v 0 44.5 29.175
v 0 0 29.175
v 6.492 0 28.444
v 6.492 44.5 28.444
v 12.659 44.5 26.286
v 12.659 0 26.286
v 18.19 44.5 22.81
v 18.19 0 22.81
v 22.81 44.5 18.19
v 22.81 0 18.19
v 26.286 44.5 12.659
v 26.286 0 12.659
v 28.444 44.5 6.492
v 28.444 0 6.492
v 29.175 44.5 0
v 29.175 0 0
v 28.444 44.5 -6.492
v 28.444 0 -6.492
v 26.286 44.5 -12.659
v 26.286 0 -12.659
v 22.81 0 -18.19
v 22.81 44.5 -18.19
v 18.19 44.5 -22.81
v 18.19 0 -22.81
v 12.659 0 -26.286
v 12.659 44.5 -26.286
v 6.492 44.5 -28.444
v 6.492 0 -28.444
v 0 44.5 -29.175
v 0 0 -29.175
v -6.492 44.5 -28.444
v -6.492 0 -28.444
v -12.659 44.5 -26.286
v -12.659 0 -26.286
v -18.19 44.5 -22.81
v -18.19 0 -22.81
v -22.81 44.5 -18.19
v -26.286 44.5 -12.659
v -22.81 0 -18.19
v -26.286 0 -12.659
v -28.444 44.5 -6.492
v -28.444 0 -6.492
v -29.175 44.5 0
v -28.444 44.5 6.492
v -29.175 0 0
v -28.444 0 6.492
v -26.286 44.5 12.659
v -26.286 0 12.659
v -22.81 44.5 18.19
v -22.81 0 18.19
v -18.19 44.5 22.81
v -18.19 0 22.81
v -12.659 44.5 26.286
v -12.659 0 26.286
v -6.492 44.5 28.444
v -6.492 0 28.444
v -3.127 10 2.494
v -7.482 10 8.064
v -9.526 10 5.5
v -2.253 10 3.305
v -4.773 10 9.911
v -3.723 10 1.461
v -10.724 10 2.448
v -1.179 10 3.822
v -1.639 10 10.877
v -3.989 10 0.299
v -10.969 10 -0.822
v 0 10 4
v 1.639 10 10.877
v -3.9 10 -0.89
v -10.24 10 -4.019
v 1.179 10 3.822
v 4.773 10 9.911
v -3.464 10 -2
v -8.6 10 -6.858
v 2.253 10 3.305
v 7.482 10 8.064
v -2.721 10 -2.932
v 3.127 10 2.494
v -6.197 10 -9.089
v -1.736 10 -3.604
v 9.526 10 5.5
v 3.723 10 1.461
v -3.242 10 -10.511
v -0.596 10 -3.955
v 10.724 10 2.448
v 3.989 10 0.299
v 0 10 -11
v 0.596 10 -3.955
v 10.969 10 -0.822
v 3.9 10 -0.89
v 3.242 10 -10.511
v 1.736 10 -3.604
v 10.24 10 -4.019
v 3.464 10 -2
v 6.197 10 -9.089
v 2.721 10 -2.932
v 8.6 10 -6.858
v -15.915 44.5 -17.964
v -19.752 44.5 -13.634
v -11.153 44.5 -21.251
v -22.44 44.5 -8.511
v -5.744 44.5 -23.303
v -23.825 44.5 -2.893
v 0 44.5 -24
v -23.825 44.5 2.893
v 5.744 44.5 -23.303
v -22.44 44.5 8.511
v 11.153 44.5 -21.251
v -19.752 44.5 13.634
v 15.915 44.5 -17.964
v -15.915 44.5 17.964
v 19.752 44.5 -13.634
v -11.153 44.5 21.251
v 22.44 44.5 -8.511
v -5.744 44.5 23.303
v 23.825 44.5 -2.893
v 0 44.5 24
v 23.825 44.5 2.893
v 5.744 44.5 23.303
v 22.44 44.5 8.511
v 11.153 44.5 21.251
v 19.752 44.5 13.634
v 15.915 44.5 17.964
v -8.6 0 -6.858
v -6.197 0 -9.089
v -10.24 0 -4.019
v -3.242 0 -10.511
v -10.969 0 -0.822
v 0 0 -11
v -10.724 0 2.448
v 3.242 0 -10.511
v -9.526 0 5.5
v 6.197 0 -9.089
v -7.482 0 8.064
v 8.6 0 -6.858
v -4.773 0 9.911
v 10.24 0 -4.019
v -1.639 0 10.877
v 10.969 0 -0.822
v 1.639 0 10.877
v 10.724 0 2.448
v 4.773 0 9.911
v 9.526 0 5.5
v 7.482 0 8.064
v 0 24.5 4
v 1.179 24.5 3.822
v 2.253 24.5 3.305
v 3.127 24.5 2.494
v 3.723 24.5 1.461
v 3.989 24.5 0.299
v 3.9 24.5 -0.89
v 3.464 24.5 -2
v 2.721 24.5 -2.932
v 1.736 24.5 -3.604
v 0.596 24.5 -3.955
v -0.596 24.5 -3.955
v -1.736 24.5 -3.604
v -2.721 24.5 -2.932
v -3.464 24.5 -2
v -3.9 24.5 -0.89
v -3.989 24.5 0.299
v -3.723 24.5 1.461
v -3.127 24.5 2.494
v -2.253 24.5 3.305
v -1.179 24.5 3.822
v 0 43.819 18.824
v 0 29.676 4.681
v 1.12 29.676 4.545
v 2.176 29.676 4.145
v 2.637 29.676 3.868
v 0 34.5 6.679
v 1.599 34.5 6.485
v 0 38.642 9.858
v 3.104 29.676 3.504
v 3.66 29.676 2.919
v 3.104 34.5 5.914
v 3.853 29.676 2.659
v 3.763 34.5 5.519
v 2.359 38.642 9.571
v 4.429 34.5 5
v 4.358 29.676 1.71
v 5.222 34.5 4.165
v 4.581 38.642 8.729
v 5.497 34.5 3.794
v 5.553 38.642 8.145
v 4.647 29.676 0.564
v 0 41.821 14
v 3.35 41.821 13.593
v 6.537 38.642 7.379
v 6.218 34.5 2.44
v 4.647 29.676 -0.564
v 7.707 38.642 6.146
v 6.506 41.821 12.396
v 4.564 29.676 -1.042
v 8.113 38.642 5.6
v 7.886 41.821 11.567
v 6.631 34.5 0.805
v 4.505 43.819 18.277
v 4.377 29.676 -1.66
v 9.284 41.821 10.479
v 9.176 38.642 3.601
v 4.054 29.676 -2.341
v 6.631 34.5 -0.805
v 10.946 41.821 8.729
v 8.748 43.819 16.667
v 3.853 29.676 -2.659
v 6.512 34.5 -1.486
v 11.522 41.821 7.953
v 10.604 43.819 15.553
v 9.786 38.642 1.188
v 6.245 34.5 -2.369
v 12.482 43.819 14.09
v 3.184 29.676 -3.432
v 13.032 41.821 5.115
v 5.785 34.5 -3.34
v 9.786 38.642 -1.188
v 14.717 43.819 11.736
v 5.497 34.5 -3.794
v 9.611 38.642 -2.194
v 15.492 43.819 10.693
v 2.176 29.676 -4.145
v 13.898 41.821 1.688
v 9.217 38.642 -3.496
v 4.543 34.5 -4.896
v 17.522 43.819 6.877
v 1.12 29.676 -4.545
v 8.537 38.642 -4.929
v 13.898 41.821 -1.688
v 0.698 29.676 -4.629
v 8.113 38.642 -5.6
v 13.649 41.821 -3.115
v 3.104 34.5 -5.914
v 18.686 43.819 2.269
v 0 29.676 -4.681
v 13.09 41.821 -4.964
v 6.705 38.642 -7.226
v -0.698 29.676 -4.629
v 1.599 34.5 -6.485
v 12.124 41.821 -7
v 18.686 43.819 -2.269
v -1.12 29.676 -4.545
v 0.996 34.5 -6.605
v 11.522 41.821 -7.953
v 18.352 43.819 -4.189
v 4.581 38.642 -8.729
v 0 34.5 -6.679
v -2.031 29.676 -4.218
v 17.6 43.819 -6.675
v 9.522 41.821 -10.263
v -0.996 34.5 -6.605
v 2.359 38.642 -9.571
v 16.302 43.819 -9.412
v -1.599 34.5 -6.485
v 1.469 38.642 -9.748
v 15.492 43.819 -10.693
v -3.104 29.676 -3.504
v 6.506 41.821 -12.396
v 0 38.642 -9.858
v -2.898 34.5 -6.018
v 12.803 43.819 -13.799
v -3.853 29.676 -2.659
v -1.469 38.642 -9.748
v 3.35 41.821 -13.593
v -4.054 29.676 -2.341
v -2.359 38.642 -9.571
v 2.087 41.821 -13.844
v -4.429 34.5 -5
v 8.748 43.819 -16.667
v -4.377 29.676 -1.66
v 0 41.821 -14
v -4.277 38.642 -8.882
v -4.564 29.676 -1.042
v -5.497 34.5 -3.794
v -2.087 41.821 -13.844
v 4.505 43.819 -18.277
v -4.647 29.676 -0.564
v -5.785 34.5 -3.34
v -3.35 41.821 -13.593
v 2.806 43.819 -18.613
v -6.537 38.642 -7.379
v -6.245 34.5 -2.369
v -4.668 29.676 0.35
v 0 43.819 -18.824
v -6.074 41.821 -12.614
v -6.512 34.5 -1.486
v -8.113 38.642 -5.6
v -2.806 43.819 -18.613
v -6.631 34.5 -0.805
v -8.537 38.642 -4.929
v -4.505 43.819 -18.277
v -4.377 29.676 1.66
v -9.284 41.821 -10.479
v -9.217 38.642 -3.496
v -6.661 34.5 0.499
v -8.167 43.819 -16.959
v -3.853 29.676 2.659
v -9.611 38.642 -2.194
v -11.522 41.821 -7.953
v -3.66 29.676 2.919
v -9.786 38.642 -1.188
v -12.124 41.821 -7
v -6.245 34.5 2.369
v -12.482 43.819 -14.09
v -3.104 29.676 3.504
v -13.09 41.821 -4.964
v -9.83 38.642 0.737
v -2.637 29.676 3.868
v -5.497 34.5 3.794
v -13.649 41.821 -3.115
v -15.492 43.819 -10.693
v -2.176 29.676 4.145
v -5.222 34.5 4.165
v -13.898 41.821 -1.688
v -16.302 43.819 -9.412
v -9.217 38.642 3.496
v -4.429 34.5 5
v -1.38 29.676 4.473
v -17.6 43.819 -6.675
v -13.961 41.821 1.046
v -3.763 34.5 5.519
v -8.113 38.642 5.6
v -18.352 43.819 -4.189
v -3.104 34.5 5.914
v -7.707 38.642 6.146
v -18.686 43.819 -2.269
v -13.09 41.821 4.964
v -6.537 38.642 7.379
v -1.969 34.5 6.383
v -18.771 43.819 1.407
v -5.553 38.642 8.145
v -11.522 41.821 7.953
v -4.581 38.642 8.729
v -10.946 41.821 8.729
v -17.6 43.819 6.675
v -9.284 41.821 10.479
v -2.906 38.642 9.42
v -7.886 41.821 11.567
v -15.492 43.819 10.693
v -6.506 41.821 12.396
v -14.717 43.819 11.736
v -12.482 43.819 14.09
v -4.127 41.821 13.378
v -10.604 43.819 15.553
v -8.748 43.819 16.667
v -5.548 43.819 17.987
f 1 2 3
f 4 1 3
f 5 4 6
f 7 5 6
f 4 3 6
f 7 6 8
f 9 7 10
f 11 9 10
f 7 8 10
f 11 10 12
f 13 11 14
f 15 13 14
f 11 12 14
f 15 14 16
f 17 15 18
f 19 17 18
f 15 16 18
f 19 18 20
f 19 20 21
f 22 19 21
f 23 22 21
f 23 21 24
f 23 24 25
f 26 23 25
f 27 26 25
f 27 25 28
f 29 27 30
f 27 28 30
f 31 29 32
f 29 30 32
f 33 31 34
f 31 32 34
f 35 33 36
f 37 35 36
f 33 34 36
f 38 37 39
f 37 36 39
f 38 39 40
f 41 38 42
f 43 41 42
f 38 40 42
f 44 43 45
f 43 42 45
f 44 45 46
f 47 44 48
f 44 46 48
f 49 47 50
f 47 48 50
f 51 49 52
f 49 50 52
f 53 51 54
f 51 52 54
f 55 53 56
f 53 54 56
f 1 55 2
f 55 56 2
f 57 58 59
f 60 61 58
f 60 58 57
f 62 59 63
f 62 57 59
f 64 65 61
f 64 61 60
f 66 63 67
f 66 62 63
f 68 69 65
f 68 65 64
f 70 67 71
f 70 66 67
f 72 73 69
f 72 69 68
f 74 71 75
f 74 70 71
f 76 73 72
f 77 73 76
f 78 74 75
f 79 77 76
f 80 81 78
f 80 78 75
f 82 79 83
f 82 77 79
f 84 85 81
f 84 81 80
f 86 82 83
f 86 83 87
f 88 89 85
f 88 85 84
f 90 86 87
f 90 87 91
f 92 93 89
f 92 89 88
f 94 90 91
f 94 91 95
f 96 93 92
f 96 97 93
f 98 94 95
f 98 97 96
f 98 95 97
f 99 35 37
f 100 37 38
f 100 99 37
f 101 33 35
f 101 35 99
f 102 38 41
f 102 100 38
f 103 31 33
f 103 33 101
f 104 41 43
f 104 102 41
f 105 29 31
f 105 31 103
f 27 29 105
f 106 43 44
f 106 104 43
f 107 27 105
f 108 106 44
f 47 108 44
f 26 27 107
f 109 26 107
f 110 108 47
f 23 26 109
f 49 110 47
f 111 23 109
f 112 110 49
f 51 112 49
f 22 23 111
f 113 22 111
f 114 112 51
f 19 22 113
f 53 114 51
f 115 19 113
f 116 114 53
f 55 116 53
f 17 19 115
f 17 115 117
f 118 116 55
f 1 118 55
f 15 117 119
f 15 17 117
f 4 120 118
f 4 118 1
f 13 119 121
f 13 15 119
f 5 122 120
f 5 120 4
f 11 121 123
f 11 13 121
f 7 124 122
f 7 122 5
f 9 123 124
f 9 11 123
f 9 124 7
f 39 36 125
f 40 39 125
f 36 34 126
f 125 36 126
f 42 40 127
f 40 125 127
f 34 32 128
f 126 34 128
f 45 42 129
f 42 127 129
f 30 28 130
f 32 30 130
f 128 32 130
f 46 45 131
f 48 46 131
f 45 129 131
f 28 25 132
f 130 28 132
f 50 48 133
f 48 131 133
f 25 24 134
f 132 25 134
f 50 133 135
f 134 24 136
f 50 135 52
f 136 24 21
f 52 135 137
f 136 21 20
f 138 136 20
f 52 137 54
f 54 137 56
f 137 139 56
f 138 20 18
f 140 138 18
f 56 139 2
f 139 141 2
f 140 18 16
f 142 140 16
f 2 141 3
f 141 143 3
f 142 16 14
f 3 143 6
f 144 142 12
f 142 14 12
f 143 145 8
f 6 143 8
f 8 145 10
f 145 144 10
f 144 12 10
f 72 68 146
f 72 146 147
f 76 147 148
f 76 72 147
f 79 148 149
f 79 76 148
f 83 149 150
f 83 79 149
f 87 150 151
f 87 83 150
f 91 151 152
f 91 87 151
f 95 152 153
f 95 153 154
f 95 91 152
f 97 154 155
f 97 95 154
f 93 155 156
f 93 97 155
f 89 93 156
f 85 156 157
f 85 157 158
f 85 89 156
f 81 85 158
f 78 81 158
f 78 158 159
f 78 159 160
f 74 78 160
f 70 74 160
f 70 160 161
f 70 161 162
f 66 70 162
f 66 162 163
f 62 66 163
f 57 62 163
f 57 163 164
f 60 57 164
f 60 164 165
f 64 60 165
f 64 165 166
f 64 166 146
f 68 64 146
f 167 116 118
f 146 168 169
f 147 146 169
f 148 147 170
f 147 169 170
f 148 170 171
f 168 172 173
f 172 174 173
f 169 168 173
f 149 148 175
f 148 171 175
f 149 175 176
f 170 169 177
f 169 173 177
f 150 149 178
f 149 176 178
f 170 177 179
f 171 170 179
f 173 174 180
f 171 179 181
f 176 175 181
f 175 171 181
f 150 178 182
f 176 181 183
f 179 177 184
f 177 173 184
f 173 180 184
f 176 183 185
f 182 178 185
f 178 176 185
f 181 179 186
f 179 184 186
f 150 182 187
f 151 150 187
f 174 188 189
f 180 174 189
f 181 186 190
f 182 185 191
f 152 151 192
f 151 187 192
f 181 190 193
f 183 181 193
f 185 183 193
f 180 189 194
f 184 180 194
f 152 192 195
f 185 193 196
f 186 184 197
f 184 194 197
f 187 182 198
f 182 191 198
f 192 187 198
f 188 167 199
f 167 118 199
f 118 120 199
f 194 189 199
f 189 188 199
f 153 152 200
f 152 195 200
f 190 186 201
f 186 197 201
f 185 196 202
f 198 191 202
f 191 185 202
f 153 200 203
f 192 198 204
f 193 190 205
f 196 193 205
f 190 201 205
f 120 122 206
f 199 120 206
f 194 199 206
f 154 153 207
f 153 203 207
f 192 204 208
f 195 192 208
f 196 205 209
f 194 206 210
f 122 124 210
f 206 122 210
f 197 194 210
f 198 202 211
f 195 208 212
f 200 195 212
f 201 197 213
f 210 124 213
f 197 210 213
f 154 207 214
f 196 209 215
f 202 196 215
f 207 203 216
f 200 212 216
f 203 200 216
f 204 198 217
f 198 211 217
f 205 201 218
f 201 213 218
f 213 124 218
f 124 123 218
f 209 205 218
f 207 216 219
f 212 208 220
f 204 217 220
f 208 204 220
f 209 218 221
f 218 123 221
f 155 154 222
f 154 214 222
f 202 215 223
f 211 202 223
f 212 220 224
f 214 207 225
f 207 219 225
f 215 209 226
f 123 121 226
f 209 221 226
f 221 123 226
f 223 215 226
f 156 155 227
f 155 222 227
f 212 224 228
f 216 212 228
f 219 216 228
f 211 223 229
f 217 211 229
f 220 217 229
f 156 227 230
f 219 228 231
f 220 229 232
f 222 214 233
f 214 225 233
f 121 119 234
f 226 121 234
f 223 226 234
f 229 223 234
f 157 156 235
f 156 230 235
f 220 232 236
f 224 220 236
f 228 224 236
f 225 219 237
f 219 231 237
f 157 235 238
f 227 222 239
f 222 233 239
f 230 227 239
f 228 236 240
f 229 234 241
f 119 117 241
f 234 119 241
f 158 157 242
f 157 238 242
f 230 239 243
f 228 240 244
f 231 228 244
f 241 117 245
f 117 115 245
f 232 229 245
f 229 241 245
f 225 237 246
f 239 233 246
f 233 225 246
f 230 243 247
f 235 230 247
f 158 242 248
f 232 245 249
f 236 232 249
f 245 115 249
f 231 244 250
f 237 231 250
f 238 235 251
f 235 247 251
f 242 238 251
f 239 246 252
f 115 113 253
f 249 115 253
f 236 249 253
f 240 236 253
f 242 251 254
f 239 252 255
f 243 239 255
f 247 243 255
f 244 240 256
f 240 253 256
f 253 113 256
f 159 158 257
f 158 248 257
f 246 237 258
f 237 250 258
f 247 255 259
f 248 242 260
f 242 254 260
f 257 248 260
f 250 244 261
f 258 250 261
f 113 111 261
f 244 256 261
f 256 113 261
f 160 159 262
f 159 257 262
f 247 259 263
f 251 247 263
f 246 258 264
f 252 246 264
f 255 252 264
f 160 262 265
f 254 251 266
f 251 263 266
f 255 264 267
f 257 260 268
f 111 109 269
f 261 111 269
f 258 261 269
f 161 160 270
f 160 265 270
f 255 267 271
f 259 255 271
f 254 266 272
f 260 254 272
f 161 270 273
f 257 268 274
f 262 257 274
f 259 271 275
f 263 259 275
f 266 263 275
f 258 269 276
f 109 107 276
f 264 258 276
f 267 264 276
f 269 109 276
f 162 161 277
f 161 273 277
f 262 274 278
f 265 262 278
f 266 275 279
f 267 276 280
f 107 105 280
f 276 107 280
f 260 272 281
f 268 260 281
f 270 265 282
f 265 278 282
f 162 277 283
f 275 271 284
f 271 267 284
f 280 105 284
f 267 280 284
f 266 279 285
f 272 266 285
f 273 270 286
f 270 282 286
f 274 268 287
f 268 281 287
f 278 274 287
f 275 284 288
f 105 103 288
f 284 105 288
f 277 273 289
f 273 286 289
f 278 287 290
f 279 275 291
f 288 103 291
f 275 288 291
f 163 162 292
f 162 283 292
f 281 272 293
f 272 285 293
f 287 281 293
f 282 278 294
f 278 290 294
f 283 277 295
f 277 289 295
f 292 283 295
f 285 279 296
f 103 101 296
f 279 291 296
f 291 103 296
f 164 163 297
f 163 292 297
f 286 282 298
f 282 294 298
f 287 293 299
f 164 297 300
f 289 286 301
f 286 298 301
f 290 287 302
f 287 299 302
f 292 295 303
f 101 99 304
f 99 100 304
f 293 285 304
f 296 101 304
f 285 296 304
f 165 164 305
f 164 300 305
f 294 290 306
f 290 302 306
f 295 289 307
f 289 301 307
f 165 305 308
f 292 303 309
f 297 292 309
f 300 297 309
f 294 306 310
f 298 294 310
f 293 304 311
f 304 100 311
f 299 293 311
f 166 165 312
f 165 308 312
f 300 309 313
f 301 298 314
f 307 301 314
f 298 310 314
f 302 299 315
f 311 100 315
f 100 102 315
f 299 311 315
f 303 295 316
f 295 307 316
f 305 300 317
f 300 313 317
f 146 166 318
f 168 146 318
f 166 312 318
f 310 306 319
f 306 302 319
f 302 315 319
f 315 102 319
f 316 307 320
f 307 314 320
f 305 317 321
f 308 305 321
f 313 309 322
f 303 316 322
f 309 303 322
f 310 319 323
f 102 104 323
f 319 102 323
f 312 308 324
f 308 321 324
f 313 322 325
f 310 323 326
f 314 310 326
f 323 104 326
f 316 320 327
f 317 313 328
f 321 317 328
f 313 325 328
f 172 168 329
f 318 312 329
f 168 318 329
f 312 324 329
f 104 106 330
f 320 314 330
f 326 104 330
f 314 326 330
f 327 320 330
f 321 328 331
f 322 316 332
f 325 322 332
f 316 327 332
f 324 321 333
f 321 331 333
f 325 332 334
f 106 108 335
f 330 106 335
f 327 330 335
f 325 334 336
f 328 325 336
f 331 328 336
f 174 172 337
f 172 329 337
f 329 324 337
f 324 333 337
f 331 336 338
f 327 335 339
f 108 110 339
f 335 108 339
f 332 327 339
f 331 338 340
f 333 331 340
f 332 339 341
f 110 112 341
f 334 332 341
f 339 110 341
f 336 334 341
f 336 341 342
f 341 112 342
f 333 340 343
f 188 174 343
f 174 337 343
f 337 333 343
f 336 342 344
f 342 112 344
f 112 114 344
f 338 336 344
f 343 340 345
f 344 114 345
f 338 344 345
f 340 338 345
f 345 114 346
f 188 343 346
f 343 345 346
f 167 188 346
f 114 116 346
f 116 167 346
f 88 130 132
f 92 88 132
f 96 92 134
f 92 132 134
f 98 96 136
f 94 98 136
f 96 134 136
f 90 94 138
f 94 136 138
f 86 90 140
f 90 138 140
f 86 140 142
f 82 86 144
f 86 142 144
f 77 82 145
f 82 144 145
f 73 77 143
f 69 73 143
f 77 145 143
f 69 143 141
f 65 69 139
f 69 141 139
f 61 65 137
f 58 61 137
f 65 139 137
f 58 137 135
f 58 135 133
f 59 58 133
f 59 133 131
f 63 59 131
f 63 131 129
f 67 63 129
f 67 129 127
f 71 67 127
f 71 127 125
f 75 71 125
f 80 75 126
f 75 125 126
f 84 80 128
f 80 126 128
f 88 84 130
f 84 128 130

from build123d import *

# Parameters (mm, degrees)
SKETCH1_R           = 29.175
SKETCH1_R_2         = 4
BOSS_EXTRUDE1_DEPTH = 44.5
FILLET1_R           = 20
SKETCH2_R           = 11
CUT_EXTRUDE1_DEPTH  = 10


with BuildPart() as part:
    # Sketch1 → Boss-Extrude1 (new body)
    with BuildSketch(Plane(origin=(0, 0, 0), x_dir=(1, 0, 0), z_dir=(0, 1, 0))):
        with Locations(Location((0, 0, 0), (0, 0, 270))):
            Circle(SKETCH1_R)
        with Locations(Location((0, 0, 0), (0, 0, 270))):
            Circle(SKETCH1_R_2, mode=Mode.SUBTRACT)
    extrude(amount=BOSS_EXTRUDE1_DEPTH)

    # Fillet1
    fillet1_edges = [part.edges().sort_by_distance(p)[0] for p in [
        (0, 44.5, -4),
    ]]
    fillet(fillet1_edges, radius=FILLET1_R)

    # Sketch2 → Cut-Extrude1 (cut)
    with BuildSketch(Plane.XZ):
        with Locations(Location((0, 0, 0), (0, 0, 270))):
            Circle(SKETCH2_R)
    extrude(amount=-CUT_EXTRUDE1_DEPTH, mode=Mode.SUBTRACT)


solid = part.part
